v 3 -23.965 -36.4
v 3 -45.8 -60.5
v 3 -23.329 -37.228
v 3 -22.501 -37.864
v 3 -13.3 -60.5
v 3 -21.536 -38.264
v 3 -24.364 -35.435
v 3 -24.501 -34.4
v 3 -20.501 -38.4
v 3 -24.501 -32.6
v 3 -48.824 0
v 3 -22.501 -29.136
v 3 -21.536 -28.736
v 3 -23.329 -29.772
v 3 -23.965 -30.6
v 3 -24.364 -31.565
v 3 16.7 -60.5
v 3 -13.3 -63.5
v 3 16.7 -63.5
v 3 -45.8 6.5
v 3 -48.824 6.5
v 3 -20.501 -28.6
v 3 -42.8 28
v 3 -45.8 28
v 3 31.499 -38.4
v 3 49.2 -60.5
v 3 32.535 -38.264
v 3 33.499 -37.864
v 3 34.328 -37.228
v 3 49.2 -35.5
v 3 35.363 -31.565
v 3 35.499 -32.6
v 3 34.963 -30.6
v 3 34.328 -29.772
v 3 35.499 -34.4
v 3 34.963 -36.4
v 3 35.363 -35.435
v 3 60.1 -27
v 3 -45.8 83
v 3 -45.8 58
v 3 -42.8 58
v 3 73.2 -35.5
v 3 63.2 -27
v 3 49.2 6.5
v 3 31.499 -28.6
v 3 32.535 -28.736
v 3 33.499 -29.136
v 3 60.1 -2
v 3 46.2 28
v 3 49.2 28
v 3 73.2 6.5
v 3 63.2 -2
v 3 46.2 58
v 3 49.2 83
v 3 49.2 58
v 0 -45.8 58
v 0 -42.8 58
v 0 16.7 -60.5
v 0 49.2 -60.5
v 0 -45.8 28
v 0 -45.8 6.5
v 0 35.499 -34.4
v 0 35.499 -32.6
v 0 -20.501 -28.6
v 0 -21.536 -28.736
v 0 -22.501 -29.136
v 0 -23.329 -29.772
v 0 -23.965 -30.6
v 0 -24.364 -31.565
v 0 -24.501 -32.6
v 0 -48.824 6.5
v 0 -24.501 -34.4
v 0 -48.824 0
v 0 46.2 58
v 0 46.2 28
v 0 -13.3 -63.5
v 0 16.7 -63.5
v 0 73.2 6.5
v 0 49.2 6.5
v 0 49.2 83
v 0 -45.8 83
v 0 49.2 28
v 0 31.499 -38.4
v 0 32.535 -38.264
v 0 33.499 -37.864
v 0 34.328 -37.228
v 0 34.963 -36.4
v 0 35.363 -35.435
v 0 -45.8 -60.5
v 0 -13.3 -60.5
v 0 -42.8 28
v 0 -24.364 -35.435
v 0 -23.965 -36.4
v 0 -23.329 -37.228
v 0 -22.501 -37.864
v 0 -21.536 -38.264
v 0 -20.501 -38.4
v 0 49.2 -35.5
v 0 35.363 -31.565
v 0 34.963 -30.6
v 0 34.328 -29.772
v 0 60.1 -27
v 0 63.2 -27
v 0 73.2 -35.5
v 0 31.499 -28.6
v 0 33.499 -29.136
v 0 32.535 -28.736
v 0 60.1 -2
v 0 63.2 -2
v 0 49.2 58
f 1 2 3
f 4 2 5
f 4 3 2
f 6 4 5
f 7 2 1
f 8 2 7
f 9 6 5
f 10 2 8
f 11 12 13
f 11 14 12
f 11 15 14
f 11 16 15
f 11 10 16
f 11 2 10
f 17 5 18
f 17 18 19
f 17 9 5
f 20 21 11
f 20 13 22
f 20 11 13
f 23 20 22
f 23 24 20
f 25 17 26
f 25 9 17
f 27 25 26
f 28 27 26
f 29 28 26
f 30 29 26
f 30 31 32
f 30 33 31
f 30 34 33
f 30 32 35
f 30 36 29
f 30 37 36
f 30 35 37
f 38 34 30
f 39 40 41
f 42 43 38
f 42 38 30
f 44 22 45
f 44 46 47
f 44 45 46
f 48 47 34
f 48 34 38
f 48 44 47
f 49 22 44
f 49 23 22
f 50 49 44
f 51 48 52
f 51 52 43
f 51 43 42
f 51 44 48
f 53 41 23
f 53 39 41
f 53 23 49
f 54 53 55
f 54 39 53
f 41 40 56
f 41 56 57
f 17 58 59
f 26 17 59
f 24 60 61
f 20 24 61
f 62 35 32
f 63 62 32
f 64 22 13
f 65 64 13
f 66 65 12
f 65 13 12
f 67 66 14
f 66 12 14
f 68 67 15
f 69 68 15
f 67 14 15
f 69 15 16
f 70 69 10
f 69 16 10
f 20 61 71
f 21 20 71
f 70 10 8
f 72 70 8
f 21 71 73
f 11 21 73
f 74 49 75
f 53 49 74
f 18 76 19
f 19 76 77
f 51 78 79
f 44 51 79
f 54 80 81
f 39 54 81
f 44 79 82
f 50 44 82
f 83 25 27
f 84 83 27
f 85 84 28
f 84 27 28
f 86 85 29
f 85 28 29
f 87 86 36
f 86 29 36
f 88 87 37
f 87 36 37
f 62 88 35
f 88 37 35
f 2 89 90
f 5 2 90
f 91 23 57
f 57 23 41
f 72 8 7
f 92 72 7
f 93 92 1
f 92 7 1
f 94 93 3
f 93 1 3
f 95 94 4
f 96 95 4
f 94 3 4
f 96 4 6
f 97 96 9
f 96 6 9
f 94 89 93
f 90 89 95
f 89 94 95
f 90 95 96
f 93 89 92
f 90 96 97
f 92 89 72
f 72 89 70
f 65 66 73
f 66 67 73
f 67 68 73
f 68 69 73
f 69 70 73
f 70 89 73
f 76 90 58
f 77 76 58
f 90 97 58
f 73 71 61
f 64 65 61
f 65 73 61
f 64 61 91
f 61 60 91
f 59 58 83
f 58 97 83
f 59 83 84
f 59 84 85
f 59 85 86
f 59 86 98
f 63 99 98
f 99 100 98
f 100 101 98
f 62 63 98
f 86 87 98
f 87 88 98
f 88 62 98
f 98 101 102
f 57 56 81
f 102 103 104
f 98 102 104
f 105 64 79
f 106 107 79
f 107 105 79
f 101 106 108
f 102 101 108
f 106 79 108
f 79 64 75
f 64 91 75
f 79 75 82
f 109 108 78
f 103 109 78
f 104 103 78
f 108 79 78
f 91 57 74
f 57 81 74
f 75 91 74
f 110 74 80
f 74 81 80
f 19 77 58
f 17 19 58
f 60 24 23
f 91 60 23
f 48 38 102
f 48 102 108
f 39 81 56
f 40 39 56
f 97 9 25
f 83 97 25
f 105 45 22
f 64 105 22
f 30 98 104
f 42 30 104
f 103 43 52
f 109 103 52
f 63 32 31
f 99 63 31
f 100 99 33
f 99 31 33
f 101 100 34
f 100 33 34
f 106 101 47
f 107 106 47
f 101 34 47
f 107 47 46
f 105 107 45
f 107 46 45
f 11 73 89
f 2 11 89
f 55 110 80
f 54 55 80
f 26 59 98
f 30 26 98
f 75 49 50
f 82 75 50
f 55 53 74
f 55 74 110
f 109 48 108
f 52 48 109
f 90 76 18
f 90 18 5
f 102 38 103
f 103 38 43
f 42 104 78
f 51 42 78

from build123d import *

# Parameters (mm, degrees)
F0_W     = 30
F0_H     = 3
F1_DEPTH = 3
F2_W     = 3.1
F2_H     = 25
F3_DEPTH = 25
F5_DEPTH = 25
F6_W     = 3
F6_H     = 30
F7_DEPTH = 25


with BuildPart() as f1:
    # F0 (on Right) → F1 (new body)
    with BuildSketch(Plane.YZ):
        Polygon((-45.8, 83), (-45.8, 6.5), (-48.823975, 6.5), (-48.823975, 0), (-45.8, -60.5), (-13.3, -60.5), (16.7, -60.5), (49.2, -60.5), (49.2, -35.5), (73.2, -35.5), (73.2, 6.5), (49.2, 6.5), (49.2, 83), align=None)
        with Locations((1.7, -62)):
            Rectangle(F0_W, F0_H)
    extrude(amount=F1_DEPTH)

    # F2 (on face) → F3 (cut)
    with BuildSketch(Plane.YZ.offset(3)):
        with Locations((61.65, -14.5)):
            Rectangle(F2_W, F2_H)
    extrude(amount=-F3_DEPTH, mode=Mode.SUBTRACT)

    # F4 (on face) → F5 (cut)
    with BuildSketch(Plane.YZ.offset(3)):
        with BuildLine():
            Line((31.499346, -28.6), (-20.500654, -28.6))
            ThreePointArc((-20.500654, -28.6), (-23.329081, -29.771573), (-24.500654, -32.6))
            Line((-24.500654, -32.6), (-24.500654, -34.4))
            ThreePointArc((-24.500654, -34.4), (-23.329081, -37.228427), (-20.500654, -38.4))
            Line((-20.500654, -38.4), (31.499346, -38.4))
            ThreePointArc((31.499346, -38.4), (34.327773, -37.228427), (35.499346, -34.4))
            Line((35.499346, -34.4), (35.499346, -32.6))
            ThreePointArc((35.499346, -32.6), (34.327773, -29.771573), (31.499346, -28.6))
        make_face()
    extrude(amount=-F5_DEPTH, mode=Mode.SUBTRACT)

    # F6 (on face) → F7 (cut)
    with BuildSketch(Plane.YZ.offset(3)):
        with Locations((-44.3, 43)):
            Rectangle(F6_W, F6_H)
        with Locations((47.7, 43)):
            Rectangle(F6_W, F6_H)
    extrude(amount=-F7_DEPTH, mode=Mode.SUBTRACT)


solid = f1.part
